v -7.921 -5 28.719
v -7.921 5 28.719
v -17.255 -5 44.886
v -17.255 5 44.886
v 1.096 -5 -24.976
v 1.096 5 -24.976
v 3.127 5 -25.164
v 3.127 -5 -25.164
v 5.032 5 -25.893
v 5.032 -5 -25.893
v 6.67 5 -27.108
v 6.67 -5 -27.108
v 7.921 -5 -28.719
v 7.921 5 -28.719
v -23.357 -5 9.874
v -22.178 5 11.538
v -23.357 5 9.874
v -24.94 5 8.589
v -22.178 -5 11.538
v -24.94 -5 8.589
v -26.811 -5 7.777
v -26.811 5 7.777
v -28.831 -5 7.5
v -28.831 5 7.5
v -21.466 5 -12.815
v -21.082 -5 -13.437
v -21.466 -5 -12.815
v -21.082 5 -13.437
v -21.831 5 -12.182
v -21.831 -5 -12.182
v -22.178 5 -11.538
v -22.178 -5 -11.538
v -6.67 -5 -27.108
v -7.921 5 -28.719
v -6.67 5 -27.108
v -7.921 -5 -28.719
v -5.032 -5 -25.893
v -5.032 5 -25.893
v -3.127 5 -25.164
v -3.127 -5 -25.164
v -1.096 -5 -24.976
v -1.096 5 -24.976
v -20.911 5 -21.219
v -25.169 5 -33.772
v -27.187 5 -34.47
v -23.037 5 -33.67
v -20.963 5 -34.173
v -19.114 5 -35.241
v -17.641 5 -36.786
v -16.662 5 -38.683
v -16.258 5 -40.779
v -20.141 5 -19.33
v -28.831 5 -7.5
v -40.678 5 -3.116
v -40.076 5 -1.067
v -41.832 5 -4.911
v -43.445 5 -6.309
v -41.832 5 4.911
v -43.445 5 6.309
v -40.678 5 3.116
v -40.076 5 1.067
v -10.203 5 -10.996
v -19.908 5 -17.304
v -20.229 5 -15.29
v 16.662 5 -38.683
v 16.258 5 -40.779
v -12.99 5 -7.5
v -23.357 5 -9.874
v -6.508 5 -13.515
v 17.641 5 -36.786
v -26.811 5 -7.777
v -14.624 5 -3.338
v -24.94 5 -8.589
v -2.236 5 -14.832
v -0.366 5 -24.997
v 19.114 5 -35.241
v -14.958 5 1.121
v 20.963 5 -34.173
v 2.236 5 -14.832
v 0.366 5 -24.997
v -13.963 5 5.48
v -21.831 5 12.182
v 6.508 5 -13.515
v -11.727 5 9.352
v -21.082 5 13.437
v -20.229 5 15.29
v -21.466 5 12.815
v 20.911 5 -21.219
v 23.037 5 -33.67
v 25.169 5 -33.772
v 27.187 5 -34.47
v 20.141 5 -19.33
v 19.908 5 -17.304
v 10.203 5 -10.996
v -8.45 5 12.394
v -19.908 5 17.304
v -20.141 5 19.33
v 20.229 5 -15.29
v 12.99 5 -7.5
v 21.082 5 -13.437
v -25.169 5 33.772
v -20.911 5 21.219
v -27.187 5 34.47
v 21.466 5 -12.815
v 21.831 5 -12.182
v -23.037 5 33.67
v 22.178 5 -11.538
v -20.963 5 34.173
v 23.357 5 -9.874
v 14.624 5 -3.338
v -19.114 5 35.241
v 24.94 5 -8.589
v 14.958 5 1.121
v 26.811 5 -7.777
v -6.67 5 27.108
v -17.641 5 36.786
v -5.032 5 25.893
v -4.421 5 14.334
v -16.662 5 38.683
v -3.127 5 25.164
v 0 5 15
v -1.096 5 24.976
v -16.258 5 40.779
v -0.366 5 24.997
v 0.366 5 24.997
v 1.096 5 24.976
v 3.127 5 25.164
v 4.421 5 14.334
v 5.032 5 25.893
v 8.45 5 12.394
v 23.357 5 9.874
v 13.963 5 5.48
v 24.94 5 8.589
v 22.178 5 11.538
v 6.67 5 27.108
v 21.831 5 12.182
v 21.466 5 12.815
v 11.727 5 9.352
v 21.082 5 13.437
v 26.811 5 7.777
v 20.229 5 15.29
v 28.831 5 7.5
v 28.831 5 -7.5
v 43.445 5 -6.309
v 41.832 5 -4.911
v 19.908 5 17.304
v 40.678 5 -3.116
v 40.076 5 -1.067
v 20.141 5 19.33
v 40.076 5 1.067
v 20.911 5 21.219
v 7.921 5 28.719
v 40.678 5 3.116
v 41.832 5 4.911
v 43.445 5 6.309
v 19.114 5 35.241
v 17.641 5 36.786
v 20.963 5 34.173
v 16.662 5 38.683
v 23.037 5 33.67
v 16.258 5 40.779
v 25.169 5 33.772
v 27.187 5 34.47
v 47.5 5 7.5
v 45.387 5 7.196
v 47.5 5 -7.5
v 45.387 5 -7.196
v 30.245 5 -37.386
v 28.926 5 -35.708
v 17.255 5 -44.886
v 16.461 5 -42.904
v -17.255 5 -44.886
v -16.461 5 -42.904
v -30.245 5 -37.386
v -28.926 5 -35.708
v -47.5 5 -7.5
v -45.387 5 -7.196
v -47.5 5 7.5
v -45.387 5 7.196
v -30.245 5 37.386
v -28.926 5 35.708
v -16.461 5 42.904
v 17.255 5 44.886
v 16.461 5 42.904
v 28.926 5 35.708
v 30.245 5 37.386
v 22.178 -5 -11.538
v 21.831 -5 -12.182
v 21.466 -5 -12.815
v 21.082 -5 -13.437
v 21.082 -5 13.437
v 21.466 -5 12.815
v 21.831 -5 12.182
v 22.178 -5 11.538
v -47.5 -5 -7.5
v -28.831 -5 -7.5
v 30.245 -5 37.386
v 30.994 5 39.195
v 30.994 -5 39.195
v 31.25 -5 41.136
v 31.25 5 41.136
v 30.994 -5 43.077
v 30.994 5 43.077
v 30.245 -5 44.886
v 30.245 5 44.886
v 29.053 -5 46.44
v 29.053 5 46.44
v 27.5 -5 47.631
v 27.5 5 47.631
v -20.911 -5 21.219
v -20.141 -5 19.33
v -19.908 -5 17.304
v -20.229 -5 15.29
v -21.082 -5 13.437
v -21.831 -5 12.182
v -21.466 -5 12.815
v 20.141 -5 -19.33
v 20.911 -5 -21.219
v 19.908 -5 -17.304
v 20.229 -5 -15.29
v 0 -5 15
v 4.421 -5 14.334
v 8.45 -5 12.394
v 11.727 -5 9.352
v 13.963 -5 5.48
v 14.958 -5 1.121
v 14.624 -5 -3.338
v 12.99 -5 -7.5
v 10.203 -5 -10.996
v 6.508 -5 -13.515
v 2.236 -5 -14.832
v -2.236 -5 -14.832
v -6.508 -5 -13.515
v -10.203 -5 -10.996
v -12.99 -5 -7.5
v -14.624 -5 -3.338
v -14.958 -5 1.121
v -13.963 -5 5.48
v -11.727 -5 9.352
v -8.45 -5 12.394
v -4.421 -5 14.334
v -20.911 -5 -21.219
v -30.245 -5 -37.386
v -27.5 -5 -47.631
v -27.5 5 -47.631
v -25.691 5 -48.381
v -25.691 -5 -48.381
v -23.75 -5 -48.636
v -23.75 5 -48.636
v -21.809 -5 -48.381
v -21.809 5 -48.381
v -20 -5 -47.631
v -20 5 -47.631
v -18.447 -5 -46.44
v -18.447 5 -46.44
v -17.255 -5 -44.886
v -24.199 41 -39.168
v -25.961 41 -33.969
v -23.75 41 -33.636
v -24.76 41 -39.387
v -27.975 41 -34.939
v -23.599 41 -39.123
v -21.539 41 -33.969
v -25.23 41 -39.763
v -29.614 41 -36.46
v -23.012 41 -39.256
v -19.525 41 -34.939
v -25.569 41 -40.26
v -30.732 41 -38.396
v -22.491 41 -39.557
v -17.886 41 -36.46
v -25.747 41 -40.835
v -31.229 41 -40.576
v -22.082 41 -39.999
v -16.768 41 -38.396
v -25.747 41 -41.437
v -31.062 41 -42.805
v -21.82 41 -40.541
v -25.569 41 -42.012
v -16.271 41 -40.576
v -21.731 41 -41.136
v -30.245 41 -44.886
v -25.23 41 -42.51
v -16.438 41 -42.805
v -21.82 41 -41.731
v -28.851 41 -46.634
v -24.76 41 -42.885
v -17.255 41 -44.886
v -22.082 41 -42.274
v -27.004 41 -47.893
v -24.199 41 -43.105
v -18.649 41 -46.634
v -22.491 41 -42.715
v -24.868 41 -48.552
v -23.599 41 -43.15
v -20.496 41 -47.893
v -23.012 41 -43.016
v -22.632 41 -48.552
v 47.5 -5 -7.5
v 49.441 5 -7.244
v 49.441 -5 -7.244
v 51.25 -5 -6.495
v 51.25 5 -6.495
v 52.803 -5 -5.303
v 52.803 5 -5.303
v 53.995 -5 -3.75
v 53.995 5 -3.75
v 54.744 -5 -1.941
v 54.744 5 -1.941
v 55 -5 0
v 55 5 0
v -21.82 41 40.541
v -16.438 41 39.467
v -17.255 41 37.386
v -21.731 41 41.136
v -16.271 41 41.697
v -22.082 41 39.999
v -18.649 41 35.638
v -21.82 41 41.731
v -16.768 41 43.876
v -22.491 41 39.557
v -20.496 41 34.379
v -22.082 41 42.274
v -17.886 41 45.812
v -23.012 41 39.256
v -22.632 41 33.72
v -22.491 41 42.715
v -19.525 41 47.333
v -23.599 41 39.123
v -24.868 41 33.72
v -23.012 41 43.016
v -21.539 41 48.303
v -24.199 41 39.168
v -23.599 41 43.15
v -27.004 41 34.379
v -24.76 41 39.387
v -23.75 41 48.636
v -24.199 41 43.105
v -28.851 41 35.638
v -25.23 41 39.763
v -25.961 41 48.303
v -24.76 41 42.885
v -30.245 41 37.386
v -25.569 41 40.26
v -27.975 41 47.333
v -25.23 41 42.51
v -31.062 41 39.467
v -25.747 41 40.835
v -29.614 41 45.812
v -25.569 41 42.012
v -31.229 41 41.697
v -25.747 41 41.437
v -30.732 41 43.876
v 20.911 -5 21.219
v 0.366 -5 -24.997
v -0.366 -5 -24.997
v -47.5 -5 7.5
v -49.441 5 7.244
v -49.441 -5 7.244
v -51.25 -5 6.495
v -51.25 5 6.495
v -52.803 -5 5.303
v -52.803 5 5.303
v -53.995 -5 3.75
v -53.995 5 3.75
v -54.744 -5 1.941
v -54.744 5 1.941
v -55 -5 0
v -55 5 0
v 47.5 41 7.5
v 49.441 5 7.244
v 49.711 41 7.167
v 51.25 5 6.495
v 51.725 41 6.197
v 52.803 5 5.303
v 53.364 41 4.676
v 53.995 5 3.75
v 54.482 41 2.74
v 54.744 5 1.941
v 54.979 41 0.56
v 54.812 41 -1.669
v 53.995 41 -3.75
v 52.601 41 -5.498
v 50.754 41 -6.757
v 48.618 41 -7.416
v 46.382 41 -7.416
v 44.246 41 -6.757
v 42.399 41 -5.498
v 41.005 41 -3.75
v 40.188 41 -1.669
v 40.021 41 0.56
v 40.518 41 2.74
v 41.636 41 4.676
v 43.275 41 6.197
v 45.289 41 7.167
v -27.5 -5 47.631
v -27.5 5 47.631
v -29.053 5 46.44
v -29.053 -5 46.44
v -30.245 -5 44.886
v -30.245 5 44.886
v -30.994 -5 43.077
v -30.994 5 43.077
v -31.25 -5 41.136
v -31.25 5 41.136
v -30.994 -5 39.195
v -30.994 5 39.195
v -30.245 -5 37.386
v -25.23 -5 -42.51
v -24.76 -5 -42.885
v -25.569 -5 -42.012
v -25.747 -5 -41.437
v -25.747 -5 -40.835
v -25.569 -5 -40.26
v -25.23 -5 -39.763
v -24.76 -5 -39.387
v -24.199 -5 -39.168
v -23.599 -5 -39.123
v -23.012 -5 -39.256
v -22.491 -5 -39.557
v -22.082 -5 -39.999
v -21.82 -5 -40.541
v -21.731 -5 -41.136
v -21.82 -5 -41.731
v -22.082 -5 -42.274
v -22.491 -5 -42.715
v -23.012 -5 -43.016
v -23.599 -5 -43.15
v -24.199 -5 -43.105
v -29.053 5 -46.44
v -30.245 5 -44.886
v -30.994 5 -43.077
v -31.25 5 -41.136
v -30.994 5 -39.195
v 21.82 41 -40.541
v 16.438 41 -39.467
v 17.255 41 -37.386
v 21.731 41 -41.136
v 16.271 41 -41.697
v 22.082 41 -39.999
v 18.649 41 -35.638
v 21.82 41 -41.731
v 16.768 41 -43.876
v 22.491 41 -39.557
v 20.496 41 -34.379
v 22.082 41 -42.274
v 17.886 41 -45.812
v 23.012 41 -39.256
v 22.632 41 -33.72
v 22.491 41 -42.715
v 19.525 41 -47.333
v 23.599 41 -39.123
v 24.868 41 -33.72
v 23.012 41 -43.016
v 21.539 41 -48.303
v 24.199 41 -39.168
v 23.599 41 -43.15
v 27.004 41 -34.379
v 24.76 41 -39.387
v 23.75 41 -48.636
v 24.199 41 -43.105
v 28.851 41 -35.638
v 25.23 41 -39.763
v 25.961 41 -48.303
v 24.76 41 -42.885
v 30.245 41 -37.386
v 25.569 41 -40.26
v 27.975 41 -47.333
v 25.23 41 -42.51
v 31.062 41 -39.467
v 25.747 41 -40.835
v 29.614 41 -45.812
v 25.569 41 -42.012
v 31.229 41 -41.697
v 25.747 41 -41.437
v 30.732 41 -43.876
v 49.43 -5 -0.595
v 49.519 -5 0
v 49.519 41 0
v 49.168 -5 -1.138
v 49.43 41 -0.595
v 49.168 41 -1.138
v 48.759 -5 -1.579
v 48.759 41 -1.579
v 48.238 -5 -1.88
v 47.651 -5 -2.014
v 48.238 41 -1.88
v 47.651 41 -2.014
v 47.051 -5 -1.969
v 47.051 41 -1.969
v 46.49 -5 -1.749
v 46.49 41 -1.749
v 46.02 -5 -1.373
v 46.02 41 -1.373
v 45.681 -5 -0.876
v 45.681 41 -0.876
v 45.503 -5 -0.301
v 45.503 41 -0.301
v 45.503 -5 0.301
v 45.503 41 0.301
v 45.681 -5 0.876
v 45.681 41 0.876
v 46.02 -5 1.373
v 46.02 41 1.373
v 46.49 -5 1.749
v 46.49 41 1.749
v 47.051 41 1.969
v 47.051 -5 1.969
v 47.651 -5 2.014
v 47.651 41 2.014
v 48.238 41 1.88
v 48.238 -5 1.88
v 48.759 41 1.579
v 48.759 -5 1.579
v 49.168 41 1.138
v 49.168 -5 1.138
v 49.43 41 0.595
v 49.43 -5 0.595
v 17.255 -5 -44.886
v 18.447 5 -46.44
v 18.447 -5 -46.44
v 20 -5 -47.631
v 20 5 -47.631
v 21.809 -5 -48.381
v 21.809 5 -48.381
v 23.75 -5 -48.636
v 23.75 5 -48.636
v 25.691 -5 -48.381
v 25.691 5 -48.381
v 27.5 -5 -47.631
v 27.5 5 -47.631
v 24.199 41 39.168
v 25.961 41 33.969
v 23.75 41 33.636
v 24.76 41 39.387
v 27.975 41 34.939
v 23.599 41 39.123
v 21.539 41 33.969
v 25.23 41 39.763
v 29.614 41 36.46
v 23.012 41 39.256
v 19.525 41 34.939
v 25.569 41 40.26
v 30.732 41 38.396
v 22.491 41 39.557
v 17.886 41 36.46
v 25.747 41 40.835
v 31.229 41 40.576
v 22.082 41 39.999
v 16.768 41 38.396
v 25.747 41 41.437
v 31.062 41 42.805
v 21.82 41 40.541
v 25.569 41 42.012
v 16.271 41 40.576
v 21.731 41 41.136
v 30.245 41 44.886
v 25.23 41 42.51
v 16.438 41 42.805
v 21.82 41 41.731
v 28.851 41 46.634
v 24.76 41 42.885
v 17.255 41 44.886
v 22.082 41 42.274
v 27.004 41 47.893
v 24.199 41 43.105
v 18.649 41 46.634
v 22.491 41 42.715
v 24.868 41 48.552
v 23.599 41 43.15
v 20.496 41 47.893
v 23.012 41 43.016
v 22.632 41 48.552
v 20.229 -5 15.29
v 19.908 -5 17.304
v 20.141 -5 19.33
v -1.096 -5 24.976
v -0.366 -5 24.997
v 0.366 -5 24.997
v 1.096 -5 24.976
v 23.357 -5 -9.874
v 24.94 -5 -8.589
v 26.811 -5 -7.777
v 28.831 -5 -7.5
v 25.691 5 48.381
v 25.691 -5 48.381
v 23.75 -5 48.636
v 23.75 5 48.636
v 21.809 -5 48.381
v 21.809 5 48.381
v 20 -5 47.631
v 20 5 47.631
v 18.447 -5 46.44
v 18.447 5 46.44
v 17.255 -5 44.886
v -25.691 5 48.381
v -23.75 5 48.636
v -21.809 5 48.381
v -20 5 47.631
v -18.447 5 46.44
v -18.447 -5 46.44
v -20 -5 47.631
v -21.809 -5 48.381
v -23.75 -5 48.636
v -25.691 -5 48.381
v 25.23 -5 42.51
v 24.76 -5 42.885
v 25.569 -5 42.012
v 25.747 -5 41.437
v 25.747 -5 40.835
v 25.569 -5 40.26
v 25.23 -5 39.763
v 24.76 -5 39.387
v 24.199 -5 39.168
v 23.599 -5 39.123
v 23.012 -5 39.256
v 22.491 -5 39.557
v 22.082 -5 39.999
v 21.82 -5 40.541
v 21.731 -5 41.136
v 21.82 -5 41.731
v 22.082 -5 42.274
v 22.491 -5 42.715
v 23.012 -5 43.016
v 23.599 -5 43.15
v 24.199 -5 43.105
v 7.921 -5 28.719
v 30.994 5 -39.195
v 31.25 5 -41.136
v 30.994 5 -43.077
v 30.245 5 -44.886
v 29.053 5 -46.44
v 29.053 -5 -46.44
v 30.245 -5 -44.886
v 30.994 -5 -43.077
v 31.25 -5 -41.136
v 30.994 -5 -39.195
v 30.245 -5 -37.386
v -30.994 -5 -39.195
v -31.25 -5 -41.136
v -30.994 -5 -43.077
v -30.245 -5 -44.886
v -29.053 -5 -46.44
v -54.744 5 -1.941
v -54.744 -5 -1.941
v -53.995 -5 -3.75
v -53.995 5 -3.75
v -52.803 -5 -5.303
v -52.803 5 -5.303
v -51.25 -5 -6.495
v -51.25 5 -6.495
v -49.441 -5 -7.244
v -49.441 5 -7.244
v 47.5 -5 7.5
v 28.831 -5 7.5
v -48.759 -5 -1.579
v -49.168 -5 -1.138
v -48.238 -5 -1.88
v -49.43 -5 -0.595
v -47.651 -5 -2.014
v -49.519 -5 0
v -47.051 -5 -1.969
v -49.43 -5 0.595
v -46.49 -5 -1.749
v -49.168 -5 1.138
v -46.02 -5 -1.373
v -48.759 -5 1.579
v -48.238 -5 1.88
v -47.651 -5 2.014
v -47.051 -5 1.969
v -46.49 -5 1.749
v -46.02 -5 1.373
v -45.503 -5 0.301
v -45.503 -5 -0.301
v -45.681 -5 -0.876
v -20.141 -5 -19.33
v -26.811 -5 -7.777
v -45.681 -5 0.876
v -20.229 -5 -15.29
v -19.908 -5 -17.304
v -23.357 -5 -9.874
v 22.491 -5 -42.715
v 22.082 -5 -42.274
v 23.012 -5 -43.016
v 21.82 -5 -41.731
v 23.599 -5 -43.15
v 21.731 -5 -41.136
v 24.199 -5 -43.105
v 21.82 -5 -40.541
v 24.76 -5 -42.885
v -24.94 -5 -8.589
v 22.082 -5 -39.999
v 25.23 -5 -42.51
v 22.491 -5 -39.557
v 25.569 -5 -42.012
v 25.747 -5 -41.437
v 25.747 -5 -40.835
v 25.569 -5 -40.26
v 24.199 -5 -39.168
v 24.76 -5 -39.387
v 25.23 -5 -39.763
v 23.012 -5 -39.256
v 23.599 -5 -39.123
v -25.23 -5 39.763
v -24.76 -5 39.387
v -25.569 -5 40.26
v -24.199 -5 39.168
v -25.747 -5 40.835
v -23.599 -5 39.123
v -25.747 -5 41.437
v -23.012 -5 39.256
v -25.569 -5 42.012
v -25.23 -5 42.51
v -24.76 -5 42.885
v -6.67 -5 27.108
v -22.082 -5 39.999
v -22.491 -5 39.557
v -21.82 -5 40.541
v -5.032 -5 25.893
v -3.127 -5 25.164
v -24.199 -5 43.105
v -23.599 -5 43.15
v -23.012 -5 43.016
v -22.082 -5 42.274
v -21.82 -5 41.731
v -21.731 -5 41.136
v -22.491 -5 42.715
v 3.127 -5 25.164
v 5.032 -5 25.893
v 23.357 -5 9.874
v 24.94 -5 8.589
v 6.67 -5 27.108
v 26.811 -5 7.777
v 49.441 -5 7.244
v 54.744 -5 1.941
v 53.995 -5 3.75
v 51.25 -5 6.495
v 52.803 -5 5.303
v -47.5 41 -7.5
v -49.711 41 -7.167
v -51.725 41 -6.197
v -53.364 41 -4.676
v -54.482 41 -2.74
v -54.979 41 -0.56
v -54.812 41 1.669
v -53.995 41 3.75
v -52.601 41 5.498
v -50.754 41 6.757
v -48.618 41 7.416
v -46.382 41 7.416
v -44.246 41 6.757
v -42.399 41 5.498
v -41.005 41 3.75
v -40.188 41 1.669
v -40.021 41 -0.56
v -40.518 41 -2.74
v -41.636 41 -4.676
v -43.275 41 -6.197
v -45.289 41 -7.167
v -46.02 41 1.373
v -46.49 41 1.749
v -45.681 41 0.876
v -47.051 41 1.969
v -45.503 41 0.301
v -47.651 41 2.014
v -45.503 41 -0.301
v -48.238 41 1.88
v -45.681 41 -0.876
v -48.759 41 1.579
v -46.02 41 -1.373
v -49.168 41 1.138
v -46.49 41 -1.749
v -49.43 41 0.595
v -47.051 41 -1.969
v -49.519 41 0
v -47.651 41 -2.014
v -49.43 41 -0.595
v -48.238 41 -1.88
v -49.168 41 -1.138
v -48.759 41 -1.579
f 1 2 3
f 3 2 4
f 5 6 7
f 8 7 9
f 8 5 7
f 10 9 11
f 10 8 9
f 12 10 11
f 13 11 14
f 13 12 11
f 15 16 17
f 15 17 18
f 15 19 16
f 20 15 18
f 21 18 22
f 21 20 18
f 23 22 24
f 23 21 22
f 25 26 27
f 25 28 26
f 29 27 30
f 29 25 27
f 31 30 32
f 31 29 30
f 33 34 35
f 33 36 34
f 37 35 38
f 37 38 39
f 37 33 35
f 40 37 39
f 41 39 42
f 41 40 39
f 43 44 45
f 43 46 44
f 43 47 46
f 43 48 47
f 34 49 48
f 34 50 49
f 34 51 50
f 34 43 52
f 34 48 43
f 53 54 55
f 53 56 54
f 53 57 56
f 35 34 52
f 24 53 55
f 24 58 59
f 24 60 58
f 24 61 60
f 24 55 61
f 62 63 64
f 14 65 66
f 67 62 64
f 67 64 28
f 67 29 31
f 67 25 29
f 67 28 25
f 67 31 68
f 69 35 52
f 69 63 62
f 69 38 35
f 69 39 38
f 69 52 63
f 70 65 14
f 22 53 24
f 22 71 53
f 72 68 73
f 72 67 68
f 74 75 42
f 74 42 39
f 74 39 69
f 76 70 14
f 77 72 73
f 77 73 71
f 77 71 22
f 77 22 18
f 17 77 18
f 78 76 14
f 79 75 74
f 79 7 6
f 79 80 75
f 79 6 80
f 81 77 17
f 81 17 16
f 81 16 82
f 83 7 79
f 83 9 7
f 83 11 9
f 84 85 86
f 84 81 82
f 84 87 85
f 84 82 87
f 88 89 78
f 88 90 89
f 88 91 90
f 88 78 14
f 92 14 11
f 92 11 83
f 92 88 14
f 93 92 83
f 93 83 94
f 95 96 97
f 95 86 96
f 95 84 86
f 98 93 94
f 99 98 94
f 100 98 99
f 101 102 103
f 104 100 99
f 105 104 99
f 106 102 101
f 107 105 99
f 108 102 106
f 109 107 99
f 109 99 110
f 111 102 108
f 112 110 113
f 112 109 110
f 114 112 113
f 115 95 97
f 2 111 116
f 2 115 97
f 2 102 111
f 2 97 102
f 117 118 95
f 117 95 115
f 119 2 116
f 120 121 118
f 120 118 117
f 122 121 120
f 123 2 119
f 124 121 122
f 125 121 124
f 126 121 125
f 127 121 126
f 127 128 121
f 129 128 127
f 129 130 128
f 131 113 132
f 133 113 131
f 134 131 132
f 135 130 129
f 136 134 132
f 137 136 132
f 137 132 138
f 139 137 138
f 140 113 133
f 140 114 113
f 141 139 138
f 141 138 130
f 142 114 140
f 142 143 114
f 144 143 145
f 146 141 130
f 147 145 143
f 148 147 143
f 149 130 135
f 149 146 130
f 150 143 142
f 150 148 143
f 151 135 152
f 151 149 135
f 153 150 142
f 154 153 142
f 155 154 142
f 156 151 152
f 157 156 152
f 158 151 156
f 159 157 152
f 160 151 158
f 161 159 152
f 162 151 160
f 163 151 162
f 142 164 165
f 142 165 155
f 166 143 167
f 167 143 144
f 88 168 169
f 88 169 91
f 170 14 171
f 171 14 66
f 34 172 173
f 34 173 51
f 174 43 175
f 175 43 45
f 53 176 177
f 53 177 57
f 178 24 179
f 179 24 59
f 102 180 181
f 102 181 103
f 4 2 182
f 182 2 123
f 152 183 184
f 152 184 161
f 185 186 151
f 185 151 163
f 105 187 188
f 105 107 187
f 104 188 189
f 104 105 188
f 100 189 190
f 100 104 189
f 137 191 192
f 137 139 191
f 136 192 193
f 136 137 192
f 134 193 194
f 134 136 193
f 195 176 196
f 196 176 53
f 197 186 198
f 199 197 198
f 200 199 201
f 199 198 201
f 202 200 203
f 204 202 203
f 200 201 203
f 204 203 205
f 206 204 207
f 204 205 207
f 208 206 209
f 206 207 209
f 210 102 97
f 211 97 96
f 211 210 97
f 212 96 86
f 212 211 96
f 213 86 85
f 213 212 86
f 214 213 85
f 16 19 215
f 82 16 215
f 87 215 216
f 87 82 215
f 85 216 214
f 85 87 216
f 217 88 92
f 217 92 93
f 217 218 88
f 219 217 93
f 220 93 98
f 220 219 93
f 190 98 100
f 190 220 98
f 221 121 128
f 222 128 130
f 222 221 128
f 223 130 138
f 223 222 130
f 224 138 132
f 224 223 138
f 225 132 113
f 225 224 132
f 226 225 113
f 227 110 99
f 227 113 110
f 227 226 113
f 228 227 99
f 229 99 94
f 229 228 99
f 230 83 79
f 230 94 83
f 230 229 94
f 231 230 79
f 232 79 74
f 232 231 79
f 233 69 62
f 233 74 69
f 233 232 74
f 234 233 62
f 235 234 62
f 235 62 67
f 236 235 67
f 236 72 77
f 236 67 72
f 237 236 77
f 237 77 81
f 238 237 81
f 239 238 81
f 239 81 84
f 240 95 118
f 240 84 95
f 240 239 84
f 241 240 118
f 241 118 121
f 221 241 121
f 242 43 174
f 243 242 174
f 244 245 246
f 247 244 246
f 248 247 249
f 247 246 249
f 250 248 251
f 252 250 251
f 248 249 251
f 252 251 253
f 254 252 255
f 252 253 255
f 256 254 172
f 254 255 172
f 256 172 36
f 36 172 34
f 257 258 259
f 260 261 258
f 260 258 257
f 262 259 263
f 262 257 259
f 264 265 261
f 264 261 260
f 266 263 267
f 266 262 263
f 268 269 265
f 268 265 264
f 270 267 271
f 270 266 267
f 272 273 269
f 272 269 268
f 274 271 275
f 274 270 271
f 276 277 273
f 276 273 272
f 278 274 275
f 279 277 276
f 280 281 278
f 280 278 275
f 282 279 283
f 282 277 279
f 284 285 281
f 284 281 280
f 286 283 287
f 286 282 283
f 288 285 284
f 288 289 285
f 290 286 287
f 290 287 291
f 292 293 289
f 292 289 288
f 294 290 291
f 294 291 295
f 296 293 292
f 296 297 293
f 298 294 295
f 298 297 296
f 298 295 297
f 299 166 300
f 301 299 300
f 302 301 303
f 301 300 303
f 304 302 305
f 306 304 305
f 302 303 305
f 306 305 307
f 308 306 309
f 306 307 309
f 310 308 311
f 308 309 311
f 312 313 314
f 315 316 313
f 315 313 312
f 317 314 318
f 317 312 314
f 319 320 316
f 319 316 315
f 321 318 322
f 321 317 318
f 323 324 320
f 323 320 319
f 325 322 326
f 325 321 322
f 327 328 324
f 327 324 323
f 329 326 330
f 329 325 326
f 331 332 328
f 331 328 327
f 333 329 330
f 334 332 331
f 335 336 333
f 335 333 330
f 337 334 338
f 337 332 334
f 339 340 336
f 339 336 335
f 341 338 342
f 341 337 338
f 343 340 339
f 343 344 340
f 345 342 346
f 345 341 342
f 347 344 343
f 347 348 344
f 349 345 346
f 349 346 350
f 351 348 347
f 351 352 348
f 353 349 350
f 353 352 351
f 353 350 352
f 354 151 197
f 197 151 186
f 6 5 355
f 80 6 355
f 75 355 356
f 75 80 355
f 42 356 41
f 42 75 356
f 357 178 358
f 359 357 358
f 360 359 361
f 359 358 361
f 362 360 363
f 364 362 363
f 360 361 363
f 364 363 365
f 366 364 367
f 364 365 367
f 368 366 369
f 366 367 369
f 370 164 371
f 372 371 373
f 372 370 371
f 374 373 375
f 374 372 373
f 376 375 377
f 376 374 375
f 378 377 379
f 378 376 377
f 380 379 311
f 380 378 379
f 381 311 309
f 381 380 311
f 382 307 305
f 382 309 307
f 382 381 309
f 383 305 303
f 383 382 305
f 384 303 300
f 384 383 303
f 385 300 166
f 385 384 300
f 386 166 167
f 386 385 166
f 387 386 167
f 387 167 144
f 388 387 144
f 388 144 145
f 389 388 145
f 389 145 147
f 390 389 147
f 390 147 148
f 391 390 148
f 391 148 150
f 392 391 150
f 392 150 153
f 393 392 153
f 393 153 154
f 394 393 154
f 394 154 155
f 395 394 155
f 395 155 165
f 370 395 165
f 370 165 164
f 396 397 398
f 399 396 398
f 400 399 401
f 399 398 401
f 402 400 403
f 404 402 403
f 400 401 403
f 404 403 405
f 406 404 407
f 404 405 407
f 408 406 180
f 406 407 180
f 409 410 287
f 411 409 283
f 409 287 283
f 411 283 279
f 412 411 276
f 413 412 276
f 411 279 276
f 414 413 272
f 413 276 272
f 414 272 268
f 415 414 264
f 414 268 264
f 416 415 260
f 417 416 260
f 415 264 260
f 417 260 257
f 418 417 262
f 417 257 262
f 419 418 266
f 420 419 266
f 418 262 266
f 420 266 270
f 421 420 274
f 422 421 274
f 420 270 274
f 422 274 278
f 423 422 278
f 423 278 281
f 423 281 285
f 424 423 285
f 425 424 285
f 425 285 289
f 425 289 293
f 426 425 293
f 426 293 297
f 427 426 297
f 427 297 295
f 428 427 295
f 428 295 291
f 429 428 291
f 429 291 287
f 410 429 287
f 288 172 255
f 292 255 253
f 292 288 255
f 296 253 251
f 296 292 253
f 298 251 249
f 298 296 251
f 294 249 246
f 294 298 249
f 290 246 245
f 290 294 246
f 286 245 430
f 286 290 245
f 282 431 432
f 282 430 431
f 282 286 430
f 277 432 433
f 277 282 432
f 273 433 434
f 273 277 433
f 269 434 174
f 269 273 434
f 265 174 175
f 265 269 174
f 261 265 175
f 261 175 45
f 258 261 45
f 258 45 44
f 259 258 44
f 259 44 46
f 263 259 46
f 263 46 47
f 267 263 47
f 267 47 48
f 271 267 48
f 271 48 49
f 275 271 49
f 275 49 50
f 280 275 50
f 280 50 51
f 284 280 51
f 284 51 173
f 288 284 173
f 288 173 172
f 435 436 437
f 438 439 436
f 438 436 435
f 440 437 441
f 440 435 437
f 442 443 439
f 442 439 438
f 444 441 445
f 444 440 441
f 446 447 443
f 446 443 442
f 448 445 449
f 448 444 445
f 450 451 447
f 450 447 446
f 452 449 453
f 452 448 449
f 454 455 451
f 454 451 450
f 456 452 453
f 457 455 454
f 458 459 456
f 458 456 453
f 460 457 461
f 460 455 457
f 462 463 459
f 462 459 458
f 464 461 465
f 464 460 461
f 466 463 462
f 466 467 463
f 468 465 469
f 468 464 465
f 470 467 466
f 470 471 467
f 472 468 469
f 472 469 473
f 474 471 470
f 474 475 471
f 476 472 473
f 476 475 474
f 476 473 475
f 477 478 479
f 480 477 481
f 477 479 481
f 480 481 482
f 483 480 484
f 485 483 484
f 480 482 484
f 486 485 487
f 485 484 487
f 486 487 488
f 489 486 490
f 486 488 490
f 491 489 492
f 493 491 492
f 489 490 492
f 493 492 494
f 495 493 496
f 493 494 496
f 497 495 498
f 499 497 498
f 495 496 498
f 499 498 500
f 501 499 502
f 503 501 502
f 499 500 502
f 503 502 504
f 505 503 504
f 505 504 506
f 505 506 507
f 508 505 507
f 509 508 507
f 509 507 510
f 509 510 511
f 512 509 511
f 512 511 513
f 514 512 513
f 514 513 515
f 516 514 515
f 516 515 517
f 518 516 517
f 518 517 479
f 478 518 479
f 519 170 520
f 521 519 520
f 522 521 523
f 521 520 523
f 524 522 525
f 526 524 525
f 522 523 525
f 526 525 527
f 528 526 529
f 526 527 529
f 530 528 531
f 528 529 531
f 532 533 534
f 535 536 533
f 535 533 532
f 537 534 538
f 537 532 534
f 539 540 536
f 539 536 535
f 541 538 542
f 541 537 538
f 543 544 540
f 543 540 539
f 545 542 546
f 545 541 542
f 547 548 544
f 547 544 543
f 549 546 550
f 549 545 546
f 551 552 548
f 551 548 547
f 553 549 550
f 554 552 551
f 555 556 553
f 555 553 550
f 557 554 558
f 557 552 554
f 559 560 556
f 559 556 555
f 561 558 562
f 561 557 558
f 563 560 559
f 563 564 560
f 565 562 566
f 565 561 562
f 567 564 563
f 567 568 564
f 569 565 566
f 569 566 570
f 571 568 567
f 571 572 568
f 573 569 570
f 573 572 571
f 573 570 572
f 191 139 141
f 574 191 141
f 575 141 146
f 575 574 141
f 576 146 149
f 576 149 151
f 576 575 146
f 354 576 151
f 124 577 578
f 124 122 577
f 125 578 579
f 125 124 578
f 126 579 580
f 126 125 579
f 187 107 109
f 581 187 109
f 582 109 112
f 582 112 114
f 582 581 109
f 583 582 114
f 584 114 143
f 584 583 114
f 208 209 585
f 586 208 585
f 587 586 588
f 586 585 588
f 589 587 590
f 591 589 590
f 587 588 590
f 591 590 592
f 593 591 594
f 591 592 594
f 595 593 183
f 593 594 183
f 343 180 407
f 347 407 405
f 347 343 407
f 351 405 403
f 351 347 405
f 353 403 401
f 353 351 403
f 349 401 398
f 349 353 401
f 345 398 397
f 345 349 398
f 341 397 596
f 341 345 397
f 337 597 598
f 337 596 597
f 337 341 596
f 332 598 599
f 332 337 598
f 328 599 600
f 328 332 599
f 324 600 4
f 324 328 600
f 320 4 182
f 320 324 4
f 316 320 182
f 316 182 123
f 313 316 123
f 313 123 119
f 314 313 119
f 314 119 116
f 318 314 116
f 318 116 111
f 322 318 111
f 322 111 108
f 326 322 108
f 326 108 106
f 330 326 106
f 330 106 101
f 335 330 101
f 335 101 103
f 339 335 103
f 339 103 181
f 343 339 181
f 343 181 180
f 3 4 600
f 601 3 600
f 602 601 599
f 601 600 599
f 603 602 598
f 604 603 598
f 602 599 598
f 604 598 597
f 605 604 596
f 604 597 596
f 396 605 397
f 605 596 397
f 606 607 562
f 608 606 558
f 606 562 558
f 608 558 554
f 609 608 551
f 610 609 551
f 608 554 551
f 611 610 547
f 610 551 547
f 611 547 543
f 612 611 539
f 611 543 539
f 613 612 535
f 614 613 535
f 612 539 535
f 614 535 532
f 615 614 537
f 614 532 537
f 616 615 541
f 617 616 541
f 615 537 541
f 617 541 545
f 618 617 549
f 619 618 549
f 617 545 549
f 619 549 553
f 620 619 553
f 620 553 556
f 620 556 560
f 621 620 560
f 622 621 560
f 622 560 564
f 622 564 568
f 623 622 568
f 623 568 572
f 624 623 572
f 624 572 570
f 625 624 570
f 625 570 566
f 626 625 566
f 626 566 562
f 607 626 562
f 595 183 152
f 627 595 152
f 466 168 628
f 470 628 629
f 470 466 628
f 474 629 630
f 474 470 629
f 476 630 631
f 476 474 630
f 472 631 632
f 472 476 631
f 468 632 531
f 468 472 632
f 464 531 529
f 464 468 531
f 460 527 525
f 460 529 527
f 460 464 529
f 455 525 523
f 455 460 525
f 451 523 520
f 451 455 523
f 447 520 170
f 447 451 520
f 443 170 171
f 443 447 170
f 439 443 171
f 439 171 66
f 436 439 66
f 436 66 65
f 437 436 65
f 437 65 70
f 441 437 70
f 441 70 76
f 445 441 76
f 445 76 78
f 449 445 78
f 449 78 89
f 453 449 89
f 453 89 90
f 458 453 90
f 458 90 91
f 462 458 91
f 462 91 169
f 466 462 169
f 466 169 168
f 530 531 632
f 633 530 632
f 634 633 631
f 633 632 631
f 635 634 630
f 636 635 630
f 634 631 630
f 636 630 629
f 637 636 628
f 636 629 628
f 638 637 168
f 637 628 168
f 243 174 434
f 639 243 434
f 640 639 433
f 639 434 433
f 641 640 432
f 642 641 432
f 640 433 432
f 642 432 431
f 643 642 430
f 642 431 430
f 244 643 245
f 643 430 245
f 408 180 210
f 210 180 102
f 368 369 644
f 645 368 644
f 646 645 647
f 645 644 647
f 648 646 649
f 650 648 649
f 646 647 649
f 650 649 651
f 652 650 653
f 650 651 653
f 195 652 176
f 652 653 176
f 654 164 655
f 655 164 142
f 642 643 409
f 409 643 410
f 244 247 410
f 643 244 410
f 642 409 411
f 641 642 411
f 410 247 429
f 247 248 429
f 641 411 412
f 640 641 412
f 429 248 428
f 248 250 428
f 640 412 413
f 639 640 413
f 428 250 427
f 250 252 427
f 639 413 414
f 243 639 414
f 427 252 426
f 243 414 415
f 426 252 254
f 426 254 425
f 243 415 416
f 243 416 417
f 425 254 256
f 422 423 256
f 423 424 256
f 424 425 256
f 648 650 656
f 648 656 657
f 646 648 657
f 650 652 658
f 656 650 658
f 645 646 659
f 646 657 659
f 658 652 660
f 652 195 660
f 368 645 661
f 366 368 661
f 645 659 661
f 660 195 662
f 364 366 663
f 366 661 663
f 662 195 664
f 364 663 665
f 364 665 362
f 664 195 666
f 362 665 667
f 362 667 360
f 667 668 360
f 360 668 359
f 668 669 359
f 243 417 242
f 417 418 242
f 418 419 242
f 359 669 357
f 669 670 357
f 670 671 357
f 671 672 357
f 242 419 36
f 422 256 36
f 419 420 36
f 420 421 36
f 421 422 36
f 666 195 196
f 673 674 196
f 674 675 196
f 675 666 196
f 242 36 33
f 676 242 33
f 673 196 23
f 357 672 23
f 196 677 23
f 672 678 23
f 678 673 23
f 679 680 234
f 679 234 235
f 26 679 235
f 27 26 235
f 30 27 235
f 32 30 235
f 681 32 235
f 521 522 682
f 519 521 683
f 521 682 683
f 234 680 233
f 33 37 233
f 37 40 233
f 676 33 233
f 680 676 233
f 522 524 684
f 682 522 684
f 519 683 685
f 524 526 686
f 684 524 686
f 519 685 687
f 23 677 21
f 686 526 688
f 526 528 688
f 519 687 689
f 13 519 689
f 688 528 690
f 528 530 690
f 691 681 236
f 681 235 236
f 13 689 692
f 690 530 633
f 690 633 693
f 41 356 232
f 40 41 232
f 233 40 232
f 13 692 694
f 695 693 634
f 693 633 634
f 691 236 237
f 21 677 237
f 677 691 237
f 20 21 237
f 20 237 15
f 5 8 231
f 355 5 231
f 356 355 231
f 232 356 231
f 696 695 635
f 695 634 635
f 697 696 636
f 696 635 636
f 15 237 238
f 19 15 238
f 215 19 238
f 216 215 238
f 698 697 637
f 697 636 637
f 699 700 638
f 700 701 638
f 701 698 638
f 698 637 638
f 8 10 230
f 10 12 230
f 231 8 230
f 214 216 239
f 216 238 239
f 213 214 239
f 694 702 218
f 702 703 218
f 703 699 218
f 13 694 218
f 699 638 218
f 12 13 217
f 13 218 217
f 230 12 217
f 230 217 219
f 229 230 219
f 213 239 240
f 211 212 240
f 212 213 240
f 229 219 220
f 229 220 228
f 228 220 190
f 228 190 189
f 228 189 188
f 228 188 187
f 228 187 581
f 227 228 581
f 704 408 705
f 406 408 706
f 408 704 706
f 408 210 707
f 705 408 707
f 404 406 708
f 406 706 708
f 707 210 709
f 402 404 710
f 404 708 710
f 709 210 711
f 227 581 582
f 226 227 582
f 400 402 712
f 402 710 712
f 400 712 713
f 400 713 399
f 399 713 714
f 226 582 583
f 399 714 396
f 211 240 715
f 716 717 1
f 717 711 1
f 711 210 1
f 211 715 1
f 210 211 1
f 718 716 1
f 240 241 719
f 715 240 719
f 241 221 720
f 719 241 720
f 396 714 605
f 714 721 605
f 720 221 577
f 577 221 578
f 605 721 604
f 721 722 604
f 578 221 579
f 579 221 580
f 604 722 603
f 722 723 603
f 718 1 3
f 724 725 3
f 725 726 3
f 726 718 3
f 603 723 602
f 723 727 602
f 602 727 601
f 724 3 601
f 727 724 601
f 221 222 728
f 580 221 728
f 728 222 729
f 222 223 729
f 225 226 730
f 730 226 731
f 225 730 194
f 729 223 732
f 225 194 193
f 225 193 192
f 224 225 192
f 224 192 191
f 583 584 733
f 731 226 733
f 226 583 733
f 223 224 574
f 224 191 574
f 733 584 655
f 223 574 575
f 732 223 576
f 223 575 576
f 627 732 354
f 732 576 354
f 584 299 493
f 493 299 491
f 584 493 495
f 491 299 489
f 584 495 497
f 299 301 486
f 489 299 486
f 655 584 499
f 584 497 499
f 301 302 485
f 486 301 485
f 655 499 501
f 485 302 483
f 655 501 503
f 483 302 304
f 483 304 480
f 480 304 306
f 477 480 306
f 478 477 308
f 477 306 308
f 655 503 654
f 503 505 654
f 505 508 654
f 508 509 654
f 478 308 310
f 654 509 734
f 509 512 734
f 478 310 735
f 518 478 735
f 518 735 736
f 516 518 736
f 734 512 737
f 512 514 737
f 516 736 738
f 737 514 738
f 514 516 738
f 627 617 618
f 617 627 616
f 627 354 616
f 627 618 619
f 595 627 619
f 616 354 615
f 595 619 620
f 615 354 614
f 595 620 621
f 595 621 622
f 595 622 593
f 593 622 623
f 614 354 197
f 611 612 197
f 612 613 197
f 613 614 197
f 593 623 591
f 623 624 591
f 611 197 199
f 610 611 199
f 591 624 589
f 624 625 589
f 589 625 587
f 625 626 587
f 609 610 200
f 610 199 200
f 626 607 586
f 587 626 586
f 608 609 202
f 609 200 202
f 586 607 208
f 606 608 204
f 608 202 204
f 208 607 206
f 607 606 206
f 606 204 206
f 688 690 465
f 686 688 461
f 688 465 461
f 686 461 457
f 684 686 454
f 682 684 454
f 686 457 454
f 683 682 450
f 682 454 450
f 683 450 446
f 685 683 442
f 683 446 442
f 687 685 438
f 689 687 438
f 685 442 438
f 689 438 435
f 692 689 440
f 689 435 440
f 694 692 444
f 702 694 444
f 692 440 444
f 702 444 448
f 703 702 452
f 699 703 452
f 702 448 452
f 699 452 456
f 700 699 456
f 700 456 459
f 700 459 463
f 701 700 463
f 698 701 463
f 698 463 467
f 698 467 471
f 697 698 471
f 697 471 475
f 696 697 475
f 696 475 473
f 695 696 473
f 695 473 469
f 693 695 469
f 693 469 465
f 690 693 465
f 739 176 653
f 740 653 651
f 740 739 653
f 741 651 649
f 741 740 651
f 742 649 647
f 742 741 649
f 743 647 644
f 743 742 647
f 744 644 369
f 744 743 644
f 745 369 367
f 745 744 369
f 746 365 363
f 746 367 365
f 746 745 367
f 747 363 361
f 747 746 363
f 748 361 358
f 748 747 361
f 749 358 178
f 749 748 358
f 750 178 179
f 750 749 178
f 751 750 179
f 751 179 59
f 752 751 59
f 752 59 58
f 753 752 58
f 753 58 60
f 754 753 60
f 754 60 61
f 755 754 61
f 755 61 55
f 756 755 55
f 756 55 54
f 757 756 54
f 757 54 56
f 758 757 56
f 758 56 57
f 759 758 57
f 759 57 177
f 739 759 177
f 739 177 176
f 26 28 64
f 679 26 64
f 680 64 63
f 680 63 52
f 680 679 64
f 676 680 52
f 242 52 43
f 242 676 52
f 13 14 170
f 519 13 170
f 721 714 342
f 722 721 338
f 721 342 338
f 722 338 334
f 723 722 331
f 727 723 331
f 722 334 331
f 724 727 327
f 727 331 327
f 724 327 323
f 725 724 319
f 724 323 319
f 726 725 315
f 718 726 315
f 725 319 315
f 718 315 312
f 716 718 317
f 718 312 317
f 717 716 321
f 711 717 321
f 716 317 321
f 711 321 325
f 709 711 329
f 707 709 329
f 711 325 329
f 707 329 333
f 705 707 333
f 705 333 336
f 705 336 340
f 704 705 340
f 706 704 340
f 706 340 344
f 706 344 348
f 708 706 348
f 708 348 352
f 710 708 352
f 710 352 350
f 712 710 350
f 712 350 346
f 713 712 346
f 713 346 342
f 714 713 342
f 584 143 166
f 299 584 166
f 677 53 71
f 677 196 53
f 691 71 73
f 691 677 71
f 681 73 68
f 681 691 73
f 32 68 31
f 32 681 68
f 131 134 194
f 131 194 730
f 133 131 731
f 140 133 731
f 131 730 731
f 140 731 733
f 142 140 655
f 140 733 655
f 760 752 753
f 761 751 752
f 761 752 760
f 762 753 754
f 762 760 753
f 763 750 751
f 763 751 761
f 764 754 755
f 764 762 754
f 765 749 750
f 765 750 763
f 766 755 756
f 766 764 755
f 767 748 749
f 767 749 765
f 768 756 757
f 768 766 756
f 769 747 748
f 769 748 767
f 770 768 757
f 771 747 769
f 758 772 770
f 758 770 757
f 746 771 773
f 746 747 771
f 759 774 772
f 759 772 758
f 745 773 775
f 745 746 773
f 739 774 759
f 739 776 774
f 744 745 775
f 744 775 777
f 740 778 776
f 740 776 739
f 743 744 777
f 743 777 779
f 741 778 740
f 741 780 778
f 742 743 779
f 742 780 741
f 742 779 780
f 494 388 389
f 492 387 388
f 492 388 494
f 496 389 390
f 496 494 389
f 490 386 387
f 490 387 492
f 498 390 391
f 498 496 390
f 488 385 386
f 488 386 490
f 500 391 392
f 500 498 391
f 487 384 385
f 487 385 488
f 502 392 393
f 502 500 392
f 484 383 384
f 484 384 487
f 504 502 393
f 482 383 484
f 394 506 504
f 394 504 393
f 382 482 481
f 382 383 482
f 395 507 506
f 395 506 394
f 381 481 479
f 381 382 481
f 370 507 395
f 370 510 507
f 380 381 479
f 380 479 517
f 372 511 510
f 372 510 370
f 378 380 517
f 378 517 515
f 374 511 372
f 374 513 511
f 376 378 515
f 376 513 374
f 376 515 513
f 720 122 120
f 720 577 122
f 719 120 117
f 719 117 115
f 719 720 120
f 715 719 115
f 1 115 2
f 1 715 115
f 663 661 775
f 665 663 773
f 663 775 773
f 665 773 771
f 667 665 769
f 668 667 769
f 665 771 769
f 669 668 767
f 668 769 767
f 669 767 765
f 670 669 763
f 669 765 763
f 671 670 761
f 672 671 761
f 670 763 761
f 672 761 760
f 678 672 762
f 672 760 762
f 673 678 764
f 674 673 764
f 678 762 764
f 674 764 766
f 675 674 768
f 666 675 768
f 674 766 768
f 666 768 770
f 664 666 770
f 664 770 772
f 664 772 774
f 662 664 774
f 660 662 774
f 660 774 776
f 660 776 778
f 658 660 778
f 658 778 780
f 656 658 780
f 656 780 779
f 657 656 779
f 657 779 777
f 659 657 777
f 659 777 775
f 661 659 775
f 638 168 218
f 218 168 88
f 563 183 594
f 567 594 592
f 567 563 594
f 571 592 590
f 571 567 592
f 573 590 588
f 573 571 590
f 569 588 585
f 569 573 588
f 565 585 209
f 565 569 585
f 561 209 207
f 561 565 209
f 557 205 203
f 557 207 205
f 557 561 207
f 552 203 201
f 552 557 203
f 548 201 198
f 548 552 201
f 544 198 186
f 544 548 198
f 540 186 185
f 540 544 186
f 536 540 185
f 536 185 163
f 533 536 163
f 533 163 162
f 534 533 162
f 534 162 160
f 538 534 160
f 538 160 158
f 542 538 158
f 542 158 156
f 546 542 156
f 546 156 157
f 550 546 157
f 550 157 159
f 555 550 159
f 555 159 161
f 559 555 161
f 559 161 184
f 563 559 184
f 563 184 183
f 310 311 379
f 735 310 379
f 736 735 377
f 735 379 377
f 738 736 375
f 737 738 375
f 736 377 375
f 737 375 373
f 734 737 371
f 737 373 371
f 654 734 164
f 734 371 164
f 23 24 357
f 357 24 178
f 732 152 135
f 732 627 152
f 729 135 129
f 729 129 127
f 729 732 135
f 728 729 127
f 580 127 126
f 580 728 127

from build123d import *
from build123d.topology import SkipClean

# Parameters (mm, degrees)
SKETCH1_R                  = 25
SKETCH1_R_2                = 15
BOSS_EXTRUDE1_DEPTH        = 5
BOSS_EXTRUDE2_START        = -10
BOSS_EXTRUDE2_DEPTH        = 10
BOSS_EXTRUDE4_START        = 36
SKETCH8_R                  = 7.5
BOSS_EXTRUDE4_DEPTH        = 36
TAP_DRILL_FOR_10_32_TAP1_D = 4.0386
CIRPATTERN2_COUNT          = 6
FILLET1_R                  = 7.5


with BuildPart() as part:
    # Sketch1 → Boss-Extrude1 (new, symmetric)
    with BuildSketch(Plane(origin=(0, 0, 0), x_dir=(1, 0, 0), z_dir=(0, 1, 0))):
        with Locations(Location((0, 0, 0), (0, 0, 270))):
            Circle(SKETCH1_R)
        with Locations(Location((0, 0, 0), (0, 0, 270))):
            Circle(SKETCH1_R_2, mode=Mode.SUBTRACT)
    boss_extrude1 = extrude(amount=BOSS_EXTRUDE1_DEPTH, both=True)

    # Sketch2 → Boss-Extrude2 (add)
    with BuildSketch(Plane.XZ.offset(5).offset(BOSS_EXTRUDE2_START)):
        with BuildLine():
            ThreePointArc((55, 0), (52.803300859, 5.303300859), (47.5, 7.5))
            Line((47.5, 7.5), (23.848480035, 7.5))
            ThreePointArc((23.848480035, 7.5), (24.710443145, 3.793942482), (25, 0))
            ThreePointArc((25, 0), (24.710443145, -3.793942482), (23.848480035, -7.5))
            Line((23.848480035, -7.5), (47.5, -7.5))
            ThreePointArc((47.5, -7.5), (52.803300859, -5.303300859), (55, 0))
        make_face()
    boss_extrude2 = extrude(amount=BOSS_EXTRUDE2_DEPTH)

    # Sketch8 → Boss-Extrude4 (add)
    with SkipClean():  # the faces are left unmerged after this step: merging them gives an invalid solid
        with BuildSketch(Plane(origin=(0, 5, 0), x_dir=(1, 0, 0), z_dir=(0, 1, 0)).offset(BOSS_EXTRUDE4_START)):
            with Locations(Location((47.5, 0, 0), (0, 0, 270))):
                Circle(SKETCH8_R)
        boss_extrude4 = extrude(amount=-BOSS_EXTRUDE4_DEPTH)

    # Tap Drill for #10-32 Tap1 (through all)
    with Locations(Plane(origin=(0, -5, 0), x_dir=(-1, 0, 0), z_dir=(0, -1, 0))):
        with Locations((-47.5, 0)):
            tap_drill_for_10_32_tap1 = Hole(TAP_DRILL_FOR_10_32_TAP1_D / 2)

    # CirPattern2: Boss-Extrude1, Boss-Extrude2, Boss-Extrude4, Tap Drill for #10-32 Tap1 ×6 about axis
    cirpattern2_axis = Axis((0, 0, 0), (0, 1, 0))
    add([boss_extrude1.rotate(cirpattern2_axis, i * 360 / CIRPATTERN2_COUNT) for i in range(1, CIRPATTERN2_COUNT)])
    add([boss_extrude2.rotate(cirpattern2_axis, i * 360 / CIRPATTERN2_COUNT) for i in range(1, CIRPATTERN2_COUNT)])
    add([boss_extrude4.rotate(cirpattern2_axis, i * 360 / CIRPATTERN2_COUNT) for i in range(1, CIRPATTERN2_COUNT)])
    add([tap_drill_for_10_32_tap1.rotate(cirpattern2_axis, i * 360 / CIRPATTERN2_COUNT) for i in range(1, CIRPATTERN2_COUNT)], mode=Mode.SUBTRACT)

    # Fillet1
    fillet1_edges = [part.edges().sort_by_distance(p)[0] for p in [
        (23.848480035, 0, -7.5),
        (23.848480035, 0, 7.5),
        (18.419430546, 0, 16.903389552),
        (5.429049489, 0, 24.403389552),
        (-5.429049489, 0, 24.403389552),
        (-18.419430546, 0, 16.903389552),
        (-23.848480035, 0, 7.5),
        (-23.848480035, 0, -7.5),
        (-18.419430546, 0, -16.903389552),
        (-5.429049489, 0, -24.403389552),
        (5.429049489, 0, -24.403389552),
        (18.419430546, 0, -16.903389552),
    ]]
    fillet(fillet1_edges, radius=FILLET1_R)


solid = part.part
